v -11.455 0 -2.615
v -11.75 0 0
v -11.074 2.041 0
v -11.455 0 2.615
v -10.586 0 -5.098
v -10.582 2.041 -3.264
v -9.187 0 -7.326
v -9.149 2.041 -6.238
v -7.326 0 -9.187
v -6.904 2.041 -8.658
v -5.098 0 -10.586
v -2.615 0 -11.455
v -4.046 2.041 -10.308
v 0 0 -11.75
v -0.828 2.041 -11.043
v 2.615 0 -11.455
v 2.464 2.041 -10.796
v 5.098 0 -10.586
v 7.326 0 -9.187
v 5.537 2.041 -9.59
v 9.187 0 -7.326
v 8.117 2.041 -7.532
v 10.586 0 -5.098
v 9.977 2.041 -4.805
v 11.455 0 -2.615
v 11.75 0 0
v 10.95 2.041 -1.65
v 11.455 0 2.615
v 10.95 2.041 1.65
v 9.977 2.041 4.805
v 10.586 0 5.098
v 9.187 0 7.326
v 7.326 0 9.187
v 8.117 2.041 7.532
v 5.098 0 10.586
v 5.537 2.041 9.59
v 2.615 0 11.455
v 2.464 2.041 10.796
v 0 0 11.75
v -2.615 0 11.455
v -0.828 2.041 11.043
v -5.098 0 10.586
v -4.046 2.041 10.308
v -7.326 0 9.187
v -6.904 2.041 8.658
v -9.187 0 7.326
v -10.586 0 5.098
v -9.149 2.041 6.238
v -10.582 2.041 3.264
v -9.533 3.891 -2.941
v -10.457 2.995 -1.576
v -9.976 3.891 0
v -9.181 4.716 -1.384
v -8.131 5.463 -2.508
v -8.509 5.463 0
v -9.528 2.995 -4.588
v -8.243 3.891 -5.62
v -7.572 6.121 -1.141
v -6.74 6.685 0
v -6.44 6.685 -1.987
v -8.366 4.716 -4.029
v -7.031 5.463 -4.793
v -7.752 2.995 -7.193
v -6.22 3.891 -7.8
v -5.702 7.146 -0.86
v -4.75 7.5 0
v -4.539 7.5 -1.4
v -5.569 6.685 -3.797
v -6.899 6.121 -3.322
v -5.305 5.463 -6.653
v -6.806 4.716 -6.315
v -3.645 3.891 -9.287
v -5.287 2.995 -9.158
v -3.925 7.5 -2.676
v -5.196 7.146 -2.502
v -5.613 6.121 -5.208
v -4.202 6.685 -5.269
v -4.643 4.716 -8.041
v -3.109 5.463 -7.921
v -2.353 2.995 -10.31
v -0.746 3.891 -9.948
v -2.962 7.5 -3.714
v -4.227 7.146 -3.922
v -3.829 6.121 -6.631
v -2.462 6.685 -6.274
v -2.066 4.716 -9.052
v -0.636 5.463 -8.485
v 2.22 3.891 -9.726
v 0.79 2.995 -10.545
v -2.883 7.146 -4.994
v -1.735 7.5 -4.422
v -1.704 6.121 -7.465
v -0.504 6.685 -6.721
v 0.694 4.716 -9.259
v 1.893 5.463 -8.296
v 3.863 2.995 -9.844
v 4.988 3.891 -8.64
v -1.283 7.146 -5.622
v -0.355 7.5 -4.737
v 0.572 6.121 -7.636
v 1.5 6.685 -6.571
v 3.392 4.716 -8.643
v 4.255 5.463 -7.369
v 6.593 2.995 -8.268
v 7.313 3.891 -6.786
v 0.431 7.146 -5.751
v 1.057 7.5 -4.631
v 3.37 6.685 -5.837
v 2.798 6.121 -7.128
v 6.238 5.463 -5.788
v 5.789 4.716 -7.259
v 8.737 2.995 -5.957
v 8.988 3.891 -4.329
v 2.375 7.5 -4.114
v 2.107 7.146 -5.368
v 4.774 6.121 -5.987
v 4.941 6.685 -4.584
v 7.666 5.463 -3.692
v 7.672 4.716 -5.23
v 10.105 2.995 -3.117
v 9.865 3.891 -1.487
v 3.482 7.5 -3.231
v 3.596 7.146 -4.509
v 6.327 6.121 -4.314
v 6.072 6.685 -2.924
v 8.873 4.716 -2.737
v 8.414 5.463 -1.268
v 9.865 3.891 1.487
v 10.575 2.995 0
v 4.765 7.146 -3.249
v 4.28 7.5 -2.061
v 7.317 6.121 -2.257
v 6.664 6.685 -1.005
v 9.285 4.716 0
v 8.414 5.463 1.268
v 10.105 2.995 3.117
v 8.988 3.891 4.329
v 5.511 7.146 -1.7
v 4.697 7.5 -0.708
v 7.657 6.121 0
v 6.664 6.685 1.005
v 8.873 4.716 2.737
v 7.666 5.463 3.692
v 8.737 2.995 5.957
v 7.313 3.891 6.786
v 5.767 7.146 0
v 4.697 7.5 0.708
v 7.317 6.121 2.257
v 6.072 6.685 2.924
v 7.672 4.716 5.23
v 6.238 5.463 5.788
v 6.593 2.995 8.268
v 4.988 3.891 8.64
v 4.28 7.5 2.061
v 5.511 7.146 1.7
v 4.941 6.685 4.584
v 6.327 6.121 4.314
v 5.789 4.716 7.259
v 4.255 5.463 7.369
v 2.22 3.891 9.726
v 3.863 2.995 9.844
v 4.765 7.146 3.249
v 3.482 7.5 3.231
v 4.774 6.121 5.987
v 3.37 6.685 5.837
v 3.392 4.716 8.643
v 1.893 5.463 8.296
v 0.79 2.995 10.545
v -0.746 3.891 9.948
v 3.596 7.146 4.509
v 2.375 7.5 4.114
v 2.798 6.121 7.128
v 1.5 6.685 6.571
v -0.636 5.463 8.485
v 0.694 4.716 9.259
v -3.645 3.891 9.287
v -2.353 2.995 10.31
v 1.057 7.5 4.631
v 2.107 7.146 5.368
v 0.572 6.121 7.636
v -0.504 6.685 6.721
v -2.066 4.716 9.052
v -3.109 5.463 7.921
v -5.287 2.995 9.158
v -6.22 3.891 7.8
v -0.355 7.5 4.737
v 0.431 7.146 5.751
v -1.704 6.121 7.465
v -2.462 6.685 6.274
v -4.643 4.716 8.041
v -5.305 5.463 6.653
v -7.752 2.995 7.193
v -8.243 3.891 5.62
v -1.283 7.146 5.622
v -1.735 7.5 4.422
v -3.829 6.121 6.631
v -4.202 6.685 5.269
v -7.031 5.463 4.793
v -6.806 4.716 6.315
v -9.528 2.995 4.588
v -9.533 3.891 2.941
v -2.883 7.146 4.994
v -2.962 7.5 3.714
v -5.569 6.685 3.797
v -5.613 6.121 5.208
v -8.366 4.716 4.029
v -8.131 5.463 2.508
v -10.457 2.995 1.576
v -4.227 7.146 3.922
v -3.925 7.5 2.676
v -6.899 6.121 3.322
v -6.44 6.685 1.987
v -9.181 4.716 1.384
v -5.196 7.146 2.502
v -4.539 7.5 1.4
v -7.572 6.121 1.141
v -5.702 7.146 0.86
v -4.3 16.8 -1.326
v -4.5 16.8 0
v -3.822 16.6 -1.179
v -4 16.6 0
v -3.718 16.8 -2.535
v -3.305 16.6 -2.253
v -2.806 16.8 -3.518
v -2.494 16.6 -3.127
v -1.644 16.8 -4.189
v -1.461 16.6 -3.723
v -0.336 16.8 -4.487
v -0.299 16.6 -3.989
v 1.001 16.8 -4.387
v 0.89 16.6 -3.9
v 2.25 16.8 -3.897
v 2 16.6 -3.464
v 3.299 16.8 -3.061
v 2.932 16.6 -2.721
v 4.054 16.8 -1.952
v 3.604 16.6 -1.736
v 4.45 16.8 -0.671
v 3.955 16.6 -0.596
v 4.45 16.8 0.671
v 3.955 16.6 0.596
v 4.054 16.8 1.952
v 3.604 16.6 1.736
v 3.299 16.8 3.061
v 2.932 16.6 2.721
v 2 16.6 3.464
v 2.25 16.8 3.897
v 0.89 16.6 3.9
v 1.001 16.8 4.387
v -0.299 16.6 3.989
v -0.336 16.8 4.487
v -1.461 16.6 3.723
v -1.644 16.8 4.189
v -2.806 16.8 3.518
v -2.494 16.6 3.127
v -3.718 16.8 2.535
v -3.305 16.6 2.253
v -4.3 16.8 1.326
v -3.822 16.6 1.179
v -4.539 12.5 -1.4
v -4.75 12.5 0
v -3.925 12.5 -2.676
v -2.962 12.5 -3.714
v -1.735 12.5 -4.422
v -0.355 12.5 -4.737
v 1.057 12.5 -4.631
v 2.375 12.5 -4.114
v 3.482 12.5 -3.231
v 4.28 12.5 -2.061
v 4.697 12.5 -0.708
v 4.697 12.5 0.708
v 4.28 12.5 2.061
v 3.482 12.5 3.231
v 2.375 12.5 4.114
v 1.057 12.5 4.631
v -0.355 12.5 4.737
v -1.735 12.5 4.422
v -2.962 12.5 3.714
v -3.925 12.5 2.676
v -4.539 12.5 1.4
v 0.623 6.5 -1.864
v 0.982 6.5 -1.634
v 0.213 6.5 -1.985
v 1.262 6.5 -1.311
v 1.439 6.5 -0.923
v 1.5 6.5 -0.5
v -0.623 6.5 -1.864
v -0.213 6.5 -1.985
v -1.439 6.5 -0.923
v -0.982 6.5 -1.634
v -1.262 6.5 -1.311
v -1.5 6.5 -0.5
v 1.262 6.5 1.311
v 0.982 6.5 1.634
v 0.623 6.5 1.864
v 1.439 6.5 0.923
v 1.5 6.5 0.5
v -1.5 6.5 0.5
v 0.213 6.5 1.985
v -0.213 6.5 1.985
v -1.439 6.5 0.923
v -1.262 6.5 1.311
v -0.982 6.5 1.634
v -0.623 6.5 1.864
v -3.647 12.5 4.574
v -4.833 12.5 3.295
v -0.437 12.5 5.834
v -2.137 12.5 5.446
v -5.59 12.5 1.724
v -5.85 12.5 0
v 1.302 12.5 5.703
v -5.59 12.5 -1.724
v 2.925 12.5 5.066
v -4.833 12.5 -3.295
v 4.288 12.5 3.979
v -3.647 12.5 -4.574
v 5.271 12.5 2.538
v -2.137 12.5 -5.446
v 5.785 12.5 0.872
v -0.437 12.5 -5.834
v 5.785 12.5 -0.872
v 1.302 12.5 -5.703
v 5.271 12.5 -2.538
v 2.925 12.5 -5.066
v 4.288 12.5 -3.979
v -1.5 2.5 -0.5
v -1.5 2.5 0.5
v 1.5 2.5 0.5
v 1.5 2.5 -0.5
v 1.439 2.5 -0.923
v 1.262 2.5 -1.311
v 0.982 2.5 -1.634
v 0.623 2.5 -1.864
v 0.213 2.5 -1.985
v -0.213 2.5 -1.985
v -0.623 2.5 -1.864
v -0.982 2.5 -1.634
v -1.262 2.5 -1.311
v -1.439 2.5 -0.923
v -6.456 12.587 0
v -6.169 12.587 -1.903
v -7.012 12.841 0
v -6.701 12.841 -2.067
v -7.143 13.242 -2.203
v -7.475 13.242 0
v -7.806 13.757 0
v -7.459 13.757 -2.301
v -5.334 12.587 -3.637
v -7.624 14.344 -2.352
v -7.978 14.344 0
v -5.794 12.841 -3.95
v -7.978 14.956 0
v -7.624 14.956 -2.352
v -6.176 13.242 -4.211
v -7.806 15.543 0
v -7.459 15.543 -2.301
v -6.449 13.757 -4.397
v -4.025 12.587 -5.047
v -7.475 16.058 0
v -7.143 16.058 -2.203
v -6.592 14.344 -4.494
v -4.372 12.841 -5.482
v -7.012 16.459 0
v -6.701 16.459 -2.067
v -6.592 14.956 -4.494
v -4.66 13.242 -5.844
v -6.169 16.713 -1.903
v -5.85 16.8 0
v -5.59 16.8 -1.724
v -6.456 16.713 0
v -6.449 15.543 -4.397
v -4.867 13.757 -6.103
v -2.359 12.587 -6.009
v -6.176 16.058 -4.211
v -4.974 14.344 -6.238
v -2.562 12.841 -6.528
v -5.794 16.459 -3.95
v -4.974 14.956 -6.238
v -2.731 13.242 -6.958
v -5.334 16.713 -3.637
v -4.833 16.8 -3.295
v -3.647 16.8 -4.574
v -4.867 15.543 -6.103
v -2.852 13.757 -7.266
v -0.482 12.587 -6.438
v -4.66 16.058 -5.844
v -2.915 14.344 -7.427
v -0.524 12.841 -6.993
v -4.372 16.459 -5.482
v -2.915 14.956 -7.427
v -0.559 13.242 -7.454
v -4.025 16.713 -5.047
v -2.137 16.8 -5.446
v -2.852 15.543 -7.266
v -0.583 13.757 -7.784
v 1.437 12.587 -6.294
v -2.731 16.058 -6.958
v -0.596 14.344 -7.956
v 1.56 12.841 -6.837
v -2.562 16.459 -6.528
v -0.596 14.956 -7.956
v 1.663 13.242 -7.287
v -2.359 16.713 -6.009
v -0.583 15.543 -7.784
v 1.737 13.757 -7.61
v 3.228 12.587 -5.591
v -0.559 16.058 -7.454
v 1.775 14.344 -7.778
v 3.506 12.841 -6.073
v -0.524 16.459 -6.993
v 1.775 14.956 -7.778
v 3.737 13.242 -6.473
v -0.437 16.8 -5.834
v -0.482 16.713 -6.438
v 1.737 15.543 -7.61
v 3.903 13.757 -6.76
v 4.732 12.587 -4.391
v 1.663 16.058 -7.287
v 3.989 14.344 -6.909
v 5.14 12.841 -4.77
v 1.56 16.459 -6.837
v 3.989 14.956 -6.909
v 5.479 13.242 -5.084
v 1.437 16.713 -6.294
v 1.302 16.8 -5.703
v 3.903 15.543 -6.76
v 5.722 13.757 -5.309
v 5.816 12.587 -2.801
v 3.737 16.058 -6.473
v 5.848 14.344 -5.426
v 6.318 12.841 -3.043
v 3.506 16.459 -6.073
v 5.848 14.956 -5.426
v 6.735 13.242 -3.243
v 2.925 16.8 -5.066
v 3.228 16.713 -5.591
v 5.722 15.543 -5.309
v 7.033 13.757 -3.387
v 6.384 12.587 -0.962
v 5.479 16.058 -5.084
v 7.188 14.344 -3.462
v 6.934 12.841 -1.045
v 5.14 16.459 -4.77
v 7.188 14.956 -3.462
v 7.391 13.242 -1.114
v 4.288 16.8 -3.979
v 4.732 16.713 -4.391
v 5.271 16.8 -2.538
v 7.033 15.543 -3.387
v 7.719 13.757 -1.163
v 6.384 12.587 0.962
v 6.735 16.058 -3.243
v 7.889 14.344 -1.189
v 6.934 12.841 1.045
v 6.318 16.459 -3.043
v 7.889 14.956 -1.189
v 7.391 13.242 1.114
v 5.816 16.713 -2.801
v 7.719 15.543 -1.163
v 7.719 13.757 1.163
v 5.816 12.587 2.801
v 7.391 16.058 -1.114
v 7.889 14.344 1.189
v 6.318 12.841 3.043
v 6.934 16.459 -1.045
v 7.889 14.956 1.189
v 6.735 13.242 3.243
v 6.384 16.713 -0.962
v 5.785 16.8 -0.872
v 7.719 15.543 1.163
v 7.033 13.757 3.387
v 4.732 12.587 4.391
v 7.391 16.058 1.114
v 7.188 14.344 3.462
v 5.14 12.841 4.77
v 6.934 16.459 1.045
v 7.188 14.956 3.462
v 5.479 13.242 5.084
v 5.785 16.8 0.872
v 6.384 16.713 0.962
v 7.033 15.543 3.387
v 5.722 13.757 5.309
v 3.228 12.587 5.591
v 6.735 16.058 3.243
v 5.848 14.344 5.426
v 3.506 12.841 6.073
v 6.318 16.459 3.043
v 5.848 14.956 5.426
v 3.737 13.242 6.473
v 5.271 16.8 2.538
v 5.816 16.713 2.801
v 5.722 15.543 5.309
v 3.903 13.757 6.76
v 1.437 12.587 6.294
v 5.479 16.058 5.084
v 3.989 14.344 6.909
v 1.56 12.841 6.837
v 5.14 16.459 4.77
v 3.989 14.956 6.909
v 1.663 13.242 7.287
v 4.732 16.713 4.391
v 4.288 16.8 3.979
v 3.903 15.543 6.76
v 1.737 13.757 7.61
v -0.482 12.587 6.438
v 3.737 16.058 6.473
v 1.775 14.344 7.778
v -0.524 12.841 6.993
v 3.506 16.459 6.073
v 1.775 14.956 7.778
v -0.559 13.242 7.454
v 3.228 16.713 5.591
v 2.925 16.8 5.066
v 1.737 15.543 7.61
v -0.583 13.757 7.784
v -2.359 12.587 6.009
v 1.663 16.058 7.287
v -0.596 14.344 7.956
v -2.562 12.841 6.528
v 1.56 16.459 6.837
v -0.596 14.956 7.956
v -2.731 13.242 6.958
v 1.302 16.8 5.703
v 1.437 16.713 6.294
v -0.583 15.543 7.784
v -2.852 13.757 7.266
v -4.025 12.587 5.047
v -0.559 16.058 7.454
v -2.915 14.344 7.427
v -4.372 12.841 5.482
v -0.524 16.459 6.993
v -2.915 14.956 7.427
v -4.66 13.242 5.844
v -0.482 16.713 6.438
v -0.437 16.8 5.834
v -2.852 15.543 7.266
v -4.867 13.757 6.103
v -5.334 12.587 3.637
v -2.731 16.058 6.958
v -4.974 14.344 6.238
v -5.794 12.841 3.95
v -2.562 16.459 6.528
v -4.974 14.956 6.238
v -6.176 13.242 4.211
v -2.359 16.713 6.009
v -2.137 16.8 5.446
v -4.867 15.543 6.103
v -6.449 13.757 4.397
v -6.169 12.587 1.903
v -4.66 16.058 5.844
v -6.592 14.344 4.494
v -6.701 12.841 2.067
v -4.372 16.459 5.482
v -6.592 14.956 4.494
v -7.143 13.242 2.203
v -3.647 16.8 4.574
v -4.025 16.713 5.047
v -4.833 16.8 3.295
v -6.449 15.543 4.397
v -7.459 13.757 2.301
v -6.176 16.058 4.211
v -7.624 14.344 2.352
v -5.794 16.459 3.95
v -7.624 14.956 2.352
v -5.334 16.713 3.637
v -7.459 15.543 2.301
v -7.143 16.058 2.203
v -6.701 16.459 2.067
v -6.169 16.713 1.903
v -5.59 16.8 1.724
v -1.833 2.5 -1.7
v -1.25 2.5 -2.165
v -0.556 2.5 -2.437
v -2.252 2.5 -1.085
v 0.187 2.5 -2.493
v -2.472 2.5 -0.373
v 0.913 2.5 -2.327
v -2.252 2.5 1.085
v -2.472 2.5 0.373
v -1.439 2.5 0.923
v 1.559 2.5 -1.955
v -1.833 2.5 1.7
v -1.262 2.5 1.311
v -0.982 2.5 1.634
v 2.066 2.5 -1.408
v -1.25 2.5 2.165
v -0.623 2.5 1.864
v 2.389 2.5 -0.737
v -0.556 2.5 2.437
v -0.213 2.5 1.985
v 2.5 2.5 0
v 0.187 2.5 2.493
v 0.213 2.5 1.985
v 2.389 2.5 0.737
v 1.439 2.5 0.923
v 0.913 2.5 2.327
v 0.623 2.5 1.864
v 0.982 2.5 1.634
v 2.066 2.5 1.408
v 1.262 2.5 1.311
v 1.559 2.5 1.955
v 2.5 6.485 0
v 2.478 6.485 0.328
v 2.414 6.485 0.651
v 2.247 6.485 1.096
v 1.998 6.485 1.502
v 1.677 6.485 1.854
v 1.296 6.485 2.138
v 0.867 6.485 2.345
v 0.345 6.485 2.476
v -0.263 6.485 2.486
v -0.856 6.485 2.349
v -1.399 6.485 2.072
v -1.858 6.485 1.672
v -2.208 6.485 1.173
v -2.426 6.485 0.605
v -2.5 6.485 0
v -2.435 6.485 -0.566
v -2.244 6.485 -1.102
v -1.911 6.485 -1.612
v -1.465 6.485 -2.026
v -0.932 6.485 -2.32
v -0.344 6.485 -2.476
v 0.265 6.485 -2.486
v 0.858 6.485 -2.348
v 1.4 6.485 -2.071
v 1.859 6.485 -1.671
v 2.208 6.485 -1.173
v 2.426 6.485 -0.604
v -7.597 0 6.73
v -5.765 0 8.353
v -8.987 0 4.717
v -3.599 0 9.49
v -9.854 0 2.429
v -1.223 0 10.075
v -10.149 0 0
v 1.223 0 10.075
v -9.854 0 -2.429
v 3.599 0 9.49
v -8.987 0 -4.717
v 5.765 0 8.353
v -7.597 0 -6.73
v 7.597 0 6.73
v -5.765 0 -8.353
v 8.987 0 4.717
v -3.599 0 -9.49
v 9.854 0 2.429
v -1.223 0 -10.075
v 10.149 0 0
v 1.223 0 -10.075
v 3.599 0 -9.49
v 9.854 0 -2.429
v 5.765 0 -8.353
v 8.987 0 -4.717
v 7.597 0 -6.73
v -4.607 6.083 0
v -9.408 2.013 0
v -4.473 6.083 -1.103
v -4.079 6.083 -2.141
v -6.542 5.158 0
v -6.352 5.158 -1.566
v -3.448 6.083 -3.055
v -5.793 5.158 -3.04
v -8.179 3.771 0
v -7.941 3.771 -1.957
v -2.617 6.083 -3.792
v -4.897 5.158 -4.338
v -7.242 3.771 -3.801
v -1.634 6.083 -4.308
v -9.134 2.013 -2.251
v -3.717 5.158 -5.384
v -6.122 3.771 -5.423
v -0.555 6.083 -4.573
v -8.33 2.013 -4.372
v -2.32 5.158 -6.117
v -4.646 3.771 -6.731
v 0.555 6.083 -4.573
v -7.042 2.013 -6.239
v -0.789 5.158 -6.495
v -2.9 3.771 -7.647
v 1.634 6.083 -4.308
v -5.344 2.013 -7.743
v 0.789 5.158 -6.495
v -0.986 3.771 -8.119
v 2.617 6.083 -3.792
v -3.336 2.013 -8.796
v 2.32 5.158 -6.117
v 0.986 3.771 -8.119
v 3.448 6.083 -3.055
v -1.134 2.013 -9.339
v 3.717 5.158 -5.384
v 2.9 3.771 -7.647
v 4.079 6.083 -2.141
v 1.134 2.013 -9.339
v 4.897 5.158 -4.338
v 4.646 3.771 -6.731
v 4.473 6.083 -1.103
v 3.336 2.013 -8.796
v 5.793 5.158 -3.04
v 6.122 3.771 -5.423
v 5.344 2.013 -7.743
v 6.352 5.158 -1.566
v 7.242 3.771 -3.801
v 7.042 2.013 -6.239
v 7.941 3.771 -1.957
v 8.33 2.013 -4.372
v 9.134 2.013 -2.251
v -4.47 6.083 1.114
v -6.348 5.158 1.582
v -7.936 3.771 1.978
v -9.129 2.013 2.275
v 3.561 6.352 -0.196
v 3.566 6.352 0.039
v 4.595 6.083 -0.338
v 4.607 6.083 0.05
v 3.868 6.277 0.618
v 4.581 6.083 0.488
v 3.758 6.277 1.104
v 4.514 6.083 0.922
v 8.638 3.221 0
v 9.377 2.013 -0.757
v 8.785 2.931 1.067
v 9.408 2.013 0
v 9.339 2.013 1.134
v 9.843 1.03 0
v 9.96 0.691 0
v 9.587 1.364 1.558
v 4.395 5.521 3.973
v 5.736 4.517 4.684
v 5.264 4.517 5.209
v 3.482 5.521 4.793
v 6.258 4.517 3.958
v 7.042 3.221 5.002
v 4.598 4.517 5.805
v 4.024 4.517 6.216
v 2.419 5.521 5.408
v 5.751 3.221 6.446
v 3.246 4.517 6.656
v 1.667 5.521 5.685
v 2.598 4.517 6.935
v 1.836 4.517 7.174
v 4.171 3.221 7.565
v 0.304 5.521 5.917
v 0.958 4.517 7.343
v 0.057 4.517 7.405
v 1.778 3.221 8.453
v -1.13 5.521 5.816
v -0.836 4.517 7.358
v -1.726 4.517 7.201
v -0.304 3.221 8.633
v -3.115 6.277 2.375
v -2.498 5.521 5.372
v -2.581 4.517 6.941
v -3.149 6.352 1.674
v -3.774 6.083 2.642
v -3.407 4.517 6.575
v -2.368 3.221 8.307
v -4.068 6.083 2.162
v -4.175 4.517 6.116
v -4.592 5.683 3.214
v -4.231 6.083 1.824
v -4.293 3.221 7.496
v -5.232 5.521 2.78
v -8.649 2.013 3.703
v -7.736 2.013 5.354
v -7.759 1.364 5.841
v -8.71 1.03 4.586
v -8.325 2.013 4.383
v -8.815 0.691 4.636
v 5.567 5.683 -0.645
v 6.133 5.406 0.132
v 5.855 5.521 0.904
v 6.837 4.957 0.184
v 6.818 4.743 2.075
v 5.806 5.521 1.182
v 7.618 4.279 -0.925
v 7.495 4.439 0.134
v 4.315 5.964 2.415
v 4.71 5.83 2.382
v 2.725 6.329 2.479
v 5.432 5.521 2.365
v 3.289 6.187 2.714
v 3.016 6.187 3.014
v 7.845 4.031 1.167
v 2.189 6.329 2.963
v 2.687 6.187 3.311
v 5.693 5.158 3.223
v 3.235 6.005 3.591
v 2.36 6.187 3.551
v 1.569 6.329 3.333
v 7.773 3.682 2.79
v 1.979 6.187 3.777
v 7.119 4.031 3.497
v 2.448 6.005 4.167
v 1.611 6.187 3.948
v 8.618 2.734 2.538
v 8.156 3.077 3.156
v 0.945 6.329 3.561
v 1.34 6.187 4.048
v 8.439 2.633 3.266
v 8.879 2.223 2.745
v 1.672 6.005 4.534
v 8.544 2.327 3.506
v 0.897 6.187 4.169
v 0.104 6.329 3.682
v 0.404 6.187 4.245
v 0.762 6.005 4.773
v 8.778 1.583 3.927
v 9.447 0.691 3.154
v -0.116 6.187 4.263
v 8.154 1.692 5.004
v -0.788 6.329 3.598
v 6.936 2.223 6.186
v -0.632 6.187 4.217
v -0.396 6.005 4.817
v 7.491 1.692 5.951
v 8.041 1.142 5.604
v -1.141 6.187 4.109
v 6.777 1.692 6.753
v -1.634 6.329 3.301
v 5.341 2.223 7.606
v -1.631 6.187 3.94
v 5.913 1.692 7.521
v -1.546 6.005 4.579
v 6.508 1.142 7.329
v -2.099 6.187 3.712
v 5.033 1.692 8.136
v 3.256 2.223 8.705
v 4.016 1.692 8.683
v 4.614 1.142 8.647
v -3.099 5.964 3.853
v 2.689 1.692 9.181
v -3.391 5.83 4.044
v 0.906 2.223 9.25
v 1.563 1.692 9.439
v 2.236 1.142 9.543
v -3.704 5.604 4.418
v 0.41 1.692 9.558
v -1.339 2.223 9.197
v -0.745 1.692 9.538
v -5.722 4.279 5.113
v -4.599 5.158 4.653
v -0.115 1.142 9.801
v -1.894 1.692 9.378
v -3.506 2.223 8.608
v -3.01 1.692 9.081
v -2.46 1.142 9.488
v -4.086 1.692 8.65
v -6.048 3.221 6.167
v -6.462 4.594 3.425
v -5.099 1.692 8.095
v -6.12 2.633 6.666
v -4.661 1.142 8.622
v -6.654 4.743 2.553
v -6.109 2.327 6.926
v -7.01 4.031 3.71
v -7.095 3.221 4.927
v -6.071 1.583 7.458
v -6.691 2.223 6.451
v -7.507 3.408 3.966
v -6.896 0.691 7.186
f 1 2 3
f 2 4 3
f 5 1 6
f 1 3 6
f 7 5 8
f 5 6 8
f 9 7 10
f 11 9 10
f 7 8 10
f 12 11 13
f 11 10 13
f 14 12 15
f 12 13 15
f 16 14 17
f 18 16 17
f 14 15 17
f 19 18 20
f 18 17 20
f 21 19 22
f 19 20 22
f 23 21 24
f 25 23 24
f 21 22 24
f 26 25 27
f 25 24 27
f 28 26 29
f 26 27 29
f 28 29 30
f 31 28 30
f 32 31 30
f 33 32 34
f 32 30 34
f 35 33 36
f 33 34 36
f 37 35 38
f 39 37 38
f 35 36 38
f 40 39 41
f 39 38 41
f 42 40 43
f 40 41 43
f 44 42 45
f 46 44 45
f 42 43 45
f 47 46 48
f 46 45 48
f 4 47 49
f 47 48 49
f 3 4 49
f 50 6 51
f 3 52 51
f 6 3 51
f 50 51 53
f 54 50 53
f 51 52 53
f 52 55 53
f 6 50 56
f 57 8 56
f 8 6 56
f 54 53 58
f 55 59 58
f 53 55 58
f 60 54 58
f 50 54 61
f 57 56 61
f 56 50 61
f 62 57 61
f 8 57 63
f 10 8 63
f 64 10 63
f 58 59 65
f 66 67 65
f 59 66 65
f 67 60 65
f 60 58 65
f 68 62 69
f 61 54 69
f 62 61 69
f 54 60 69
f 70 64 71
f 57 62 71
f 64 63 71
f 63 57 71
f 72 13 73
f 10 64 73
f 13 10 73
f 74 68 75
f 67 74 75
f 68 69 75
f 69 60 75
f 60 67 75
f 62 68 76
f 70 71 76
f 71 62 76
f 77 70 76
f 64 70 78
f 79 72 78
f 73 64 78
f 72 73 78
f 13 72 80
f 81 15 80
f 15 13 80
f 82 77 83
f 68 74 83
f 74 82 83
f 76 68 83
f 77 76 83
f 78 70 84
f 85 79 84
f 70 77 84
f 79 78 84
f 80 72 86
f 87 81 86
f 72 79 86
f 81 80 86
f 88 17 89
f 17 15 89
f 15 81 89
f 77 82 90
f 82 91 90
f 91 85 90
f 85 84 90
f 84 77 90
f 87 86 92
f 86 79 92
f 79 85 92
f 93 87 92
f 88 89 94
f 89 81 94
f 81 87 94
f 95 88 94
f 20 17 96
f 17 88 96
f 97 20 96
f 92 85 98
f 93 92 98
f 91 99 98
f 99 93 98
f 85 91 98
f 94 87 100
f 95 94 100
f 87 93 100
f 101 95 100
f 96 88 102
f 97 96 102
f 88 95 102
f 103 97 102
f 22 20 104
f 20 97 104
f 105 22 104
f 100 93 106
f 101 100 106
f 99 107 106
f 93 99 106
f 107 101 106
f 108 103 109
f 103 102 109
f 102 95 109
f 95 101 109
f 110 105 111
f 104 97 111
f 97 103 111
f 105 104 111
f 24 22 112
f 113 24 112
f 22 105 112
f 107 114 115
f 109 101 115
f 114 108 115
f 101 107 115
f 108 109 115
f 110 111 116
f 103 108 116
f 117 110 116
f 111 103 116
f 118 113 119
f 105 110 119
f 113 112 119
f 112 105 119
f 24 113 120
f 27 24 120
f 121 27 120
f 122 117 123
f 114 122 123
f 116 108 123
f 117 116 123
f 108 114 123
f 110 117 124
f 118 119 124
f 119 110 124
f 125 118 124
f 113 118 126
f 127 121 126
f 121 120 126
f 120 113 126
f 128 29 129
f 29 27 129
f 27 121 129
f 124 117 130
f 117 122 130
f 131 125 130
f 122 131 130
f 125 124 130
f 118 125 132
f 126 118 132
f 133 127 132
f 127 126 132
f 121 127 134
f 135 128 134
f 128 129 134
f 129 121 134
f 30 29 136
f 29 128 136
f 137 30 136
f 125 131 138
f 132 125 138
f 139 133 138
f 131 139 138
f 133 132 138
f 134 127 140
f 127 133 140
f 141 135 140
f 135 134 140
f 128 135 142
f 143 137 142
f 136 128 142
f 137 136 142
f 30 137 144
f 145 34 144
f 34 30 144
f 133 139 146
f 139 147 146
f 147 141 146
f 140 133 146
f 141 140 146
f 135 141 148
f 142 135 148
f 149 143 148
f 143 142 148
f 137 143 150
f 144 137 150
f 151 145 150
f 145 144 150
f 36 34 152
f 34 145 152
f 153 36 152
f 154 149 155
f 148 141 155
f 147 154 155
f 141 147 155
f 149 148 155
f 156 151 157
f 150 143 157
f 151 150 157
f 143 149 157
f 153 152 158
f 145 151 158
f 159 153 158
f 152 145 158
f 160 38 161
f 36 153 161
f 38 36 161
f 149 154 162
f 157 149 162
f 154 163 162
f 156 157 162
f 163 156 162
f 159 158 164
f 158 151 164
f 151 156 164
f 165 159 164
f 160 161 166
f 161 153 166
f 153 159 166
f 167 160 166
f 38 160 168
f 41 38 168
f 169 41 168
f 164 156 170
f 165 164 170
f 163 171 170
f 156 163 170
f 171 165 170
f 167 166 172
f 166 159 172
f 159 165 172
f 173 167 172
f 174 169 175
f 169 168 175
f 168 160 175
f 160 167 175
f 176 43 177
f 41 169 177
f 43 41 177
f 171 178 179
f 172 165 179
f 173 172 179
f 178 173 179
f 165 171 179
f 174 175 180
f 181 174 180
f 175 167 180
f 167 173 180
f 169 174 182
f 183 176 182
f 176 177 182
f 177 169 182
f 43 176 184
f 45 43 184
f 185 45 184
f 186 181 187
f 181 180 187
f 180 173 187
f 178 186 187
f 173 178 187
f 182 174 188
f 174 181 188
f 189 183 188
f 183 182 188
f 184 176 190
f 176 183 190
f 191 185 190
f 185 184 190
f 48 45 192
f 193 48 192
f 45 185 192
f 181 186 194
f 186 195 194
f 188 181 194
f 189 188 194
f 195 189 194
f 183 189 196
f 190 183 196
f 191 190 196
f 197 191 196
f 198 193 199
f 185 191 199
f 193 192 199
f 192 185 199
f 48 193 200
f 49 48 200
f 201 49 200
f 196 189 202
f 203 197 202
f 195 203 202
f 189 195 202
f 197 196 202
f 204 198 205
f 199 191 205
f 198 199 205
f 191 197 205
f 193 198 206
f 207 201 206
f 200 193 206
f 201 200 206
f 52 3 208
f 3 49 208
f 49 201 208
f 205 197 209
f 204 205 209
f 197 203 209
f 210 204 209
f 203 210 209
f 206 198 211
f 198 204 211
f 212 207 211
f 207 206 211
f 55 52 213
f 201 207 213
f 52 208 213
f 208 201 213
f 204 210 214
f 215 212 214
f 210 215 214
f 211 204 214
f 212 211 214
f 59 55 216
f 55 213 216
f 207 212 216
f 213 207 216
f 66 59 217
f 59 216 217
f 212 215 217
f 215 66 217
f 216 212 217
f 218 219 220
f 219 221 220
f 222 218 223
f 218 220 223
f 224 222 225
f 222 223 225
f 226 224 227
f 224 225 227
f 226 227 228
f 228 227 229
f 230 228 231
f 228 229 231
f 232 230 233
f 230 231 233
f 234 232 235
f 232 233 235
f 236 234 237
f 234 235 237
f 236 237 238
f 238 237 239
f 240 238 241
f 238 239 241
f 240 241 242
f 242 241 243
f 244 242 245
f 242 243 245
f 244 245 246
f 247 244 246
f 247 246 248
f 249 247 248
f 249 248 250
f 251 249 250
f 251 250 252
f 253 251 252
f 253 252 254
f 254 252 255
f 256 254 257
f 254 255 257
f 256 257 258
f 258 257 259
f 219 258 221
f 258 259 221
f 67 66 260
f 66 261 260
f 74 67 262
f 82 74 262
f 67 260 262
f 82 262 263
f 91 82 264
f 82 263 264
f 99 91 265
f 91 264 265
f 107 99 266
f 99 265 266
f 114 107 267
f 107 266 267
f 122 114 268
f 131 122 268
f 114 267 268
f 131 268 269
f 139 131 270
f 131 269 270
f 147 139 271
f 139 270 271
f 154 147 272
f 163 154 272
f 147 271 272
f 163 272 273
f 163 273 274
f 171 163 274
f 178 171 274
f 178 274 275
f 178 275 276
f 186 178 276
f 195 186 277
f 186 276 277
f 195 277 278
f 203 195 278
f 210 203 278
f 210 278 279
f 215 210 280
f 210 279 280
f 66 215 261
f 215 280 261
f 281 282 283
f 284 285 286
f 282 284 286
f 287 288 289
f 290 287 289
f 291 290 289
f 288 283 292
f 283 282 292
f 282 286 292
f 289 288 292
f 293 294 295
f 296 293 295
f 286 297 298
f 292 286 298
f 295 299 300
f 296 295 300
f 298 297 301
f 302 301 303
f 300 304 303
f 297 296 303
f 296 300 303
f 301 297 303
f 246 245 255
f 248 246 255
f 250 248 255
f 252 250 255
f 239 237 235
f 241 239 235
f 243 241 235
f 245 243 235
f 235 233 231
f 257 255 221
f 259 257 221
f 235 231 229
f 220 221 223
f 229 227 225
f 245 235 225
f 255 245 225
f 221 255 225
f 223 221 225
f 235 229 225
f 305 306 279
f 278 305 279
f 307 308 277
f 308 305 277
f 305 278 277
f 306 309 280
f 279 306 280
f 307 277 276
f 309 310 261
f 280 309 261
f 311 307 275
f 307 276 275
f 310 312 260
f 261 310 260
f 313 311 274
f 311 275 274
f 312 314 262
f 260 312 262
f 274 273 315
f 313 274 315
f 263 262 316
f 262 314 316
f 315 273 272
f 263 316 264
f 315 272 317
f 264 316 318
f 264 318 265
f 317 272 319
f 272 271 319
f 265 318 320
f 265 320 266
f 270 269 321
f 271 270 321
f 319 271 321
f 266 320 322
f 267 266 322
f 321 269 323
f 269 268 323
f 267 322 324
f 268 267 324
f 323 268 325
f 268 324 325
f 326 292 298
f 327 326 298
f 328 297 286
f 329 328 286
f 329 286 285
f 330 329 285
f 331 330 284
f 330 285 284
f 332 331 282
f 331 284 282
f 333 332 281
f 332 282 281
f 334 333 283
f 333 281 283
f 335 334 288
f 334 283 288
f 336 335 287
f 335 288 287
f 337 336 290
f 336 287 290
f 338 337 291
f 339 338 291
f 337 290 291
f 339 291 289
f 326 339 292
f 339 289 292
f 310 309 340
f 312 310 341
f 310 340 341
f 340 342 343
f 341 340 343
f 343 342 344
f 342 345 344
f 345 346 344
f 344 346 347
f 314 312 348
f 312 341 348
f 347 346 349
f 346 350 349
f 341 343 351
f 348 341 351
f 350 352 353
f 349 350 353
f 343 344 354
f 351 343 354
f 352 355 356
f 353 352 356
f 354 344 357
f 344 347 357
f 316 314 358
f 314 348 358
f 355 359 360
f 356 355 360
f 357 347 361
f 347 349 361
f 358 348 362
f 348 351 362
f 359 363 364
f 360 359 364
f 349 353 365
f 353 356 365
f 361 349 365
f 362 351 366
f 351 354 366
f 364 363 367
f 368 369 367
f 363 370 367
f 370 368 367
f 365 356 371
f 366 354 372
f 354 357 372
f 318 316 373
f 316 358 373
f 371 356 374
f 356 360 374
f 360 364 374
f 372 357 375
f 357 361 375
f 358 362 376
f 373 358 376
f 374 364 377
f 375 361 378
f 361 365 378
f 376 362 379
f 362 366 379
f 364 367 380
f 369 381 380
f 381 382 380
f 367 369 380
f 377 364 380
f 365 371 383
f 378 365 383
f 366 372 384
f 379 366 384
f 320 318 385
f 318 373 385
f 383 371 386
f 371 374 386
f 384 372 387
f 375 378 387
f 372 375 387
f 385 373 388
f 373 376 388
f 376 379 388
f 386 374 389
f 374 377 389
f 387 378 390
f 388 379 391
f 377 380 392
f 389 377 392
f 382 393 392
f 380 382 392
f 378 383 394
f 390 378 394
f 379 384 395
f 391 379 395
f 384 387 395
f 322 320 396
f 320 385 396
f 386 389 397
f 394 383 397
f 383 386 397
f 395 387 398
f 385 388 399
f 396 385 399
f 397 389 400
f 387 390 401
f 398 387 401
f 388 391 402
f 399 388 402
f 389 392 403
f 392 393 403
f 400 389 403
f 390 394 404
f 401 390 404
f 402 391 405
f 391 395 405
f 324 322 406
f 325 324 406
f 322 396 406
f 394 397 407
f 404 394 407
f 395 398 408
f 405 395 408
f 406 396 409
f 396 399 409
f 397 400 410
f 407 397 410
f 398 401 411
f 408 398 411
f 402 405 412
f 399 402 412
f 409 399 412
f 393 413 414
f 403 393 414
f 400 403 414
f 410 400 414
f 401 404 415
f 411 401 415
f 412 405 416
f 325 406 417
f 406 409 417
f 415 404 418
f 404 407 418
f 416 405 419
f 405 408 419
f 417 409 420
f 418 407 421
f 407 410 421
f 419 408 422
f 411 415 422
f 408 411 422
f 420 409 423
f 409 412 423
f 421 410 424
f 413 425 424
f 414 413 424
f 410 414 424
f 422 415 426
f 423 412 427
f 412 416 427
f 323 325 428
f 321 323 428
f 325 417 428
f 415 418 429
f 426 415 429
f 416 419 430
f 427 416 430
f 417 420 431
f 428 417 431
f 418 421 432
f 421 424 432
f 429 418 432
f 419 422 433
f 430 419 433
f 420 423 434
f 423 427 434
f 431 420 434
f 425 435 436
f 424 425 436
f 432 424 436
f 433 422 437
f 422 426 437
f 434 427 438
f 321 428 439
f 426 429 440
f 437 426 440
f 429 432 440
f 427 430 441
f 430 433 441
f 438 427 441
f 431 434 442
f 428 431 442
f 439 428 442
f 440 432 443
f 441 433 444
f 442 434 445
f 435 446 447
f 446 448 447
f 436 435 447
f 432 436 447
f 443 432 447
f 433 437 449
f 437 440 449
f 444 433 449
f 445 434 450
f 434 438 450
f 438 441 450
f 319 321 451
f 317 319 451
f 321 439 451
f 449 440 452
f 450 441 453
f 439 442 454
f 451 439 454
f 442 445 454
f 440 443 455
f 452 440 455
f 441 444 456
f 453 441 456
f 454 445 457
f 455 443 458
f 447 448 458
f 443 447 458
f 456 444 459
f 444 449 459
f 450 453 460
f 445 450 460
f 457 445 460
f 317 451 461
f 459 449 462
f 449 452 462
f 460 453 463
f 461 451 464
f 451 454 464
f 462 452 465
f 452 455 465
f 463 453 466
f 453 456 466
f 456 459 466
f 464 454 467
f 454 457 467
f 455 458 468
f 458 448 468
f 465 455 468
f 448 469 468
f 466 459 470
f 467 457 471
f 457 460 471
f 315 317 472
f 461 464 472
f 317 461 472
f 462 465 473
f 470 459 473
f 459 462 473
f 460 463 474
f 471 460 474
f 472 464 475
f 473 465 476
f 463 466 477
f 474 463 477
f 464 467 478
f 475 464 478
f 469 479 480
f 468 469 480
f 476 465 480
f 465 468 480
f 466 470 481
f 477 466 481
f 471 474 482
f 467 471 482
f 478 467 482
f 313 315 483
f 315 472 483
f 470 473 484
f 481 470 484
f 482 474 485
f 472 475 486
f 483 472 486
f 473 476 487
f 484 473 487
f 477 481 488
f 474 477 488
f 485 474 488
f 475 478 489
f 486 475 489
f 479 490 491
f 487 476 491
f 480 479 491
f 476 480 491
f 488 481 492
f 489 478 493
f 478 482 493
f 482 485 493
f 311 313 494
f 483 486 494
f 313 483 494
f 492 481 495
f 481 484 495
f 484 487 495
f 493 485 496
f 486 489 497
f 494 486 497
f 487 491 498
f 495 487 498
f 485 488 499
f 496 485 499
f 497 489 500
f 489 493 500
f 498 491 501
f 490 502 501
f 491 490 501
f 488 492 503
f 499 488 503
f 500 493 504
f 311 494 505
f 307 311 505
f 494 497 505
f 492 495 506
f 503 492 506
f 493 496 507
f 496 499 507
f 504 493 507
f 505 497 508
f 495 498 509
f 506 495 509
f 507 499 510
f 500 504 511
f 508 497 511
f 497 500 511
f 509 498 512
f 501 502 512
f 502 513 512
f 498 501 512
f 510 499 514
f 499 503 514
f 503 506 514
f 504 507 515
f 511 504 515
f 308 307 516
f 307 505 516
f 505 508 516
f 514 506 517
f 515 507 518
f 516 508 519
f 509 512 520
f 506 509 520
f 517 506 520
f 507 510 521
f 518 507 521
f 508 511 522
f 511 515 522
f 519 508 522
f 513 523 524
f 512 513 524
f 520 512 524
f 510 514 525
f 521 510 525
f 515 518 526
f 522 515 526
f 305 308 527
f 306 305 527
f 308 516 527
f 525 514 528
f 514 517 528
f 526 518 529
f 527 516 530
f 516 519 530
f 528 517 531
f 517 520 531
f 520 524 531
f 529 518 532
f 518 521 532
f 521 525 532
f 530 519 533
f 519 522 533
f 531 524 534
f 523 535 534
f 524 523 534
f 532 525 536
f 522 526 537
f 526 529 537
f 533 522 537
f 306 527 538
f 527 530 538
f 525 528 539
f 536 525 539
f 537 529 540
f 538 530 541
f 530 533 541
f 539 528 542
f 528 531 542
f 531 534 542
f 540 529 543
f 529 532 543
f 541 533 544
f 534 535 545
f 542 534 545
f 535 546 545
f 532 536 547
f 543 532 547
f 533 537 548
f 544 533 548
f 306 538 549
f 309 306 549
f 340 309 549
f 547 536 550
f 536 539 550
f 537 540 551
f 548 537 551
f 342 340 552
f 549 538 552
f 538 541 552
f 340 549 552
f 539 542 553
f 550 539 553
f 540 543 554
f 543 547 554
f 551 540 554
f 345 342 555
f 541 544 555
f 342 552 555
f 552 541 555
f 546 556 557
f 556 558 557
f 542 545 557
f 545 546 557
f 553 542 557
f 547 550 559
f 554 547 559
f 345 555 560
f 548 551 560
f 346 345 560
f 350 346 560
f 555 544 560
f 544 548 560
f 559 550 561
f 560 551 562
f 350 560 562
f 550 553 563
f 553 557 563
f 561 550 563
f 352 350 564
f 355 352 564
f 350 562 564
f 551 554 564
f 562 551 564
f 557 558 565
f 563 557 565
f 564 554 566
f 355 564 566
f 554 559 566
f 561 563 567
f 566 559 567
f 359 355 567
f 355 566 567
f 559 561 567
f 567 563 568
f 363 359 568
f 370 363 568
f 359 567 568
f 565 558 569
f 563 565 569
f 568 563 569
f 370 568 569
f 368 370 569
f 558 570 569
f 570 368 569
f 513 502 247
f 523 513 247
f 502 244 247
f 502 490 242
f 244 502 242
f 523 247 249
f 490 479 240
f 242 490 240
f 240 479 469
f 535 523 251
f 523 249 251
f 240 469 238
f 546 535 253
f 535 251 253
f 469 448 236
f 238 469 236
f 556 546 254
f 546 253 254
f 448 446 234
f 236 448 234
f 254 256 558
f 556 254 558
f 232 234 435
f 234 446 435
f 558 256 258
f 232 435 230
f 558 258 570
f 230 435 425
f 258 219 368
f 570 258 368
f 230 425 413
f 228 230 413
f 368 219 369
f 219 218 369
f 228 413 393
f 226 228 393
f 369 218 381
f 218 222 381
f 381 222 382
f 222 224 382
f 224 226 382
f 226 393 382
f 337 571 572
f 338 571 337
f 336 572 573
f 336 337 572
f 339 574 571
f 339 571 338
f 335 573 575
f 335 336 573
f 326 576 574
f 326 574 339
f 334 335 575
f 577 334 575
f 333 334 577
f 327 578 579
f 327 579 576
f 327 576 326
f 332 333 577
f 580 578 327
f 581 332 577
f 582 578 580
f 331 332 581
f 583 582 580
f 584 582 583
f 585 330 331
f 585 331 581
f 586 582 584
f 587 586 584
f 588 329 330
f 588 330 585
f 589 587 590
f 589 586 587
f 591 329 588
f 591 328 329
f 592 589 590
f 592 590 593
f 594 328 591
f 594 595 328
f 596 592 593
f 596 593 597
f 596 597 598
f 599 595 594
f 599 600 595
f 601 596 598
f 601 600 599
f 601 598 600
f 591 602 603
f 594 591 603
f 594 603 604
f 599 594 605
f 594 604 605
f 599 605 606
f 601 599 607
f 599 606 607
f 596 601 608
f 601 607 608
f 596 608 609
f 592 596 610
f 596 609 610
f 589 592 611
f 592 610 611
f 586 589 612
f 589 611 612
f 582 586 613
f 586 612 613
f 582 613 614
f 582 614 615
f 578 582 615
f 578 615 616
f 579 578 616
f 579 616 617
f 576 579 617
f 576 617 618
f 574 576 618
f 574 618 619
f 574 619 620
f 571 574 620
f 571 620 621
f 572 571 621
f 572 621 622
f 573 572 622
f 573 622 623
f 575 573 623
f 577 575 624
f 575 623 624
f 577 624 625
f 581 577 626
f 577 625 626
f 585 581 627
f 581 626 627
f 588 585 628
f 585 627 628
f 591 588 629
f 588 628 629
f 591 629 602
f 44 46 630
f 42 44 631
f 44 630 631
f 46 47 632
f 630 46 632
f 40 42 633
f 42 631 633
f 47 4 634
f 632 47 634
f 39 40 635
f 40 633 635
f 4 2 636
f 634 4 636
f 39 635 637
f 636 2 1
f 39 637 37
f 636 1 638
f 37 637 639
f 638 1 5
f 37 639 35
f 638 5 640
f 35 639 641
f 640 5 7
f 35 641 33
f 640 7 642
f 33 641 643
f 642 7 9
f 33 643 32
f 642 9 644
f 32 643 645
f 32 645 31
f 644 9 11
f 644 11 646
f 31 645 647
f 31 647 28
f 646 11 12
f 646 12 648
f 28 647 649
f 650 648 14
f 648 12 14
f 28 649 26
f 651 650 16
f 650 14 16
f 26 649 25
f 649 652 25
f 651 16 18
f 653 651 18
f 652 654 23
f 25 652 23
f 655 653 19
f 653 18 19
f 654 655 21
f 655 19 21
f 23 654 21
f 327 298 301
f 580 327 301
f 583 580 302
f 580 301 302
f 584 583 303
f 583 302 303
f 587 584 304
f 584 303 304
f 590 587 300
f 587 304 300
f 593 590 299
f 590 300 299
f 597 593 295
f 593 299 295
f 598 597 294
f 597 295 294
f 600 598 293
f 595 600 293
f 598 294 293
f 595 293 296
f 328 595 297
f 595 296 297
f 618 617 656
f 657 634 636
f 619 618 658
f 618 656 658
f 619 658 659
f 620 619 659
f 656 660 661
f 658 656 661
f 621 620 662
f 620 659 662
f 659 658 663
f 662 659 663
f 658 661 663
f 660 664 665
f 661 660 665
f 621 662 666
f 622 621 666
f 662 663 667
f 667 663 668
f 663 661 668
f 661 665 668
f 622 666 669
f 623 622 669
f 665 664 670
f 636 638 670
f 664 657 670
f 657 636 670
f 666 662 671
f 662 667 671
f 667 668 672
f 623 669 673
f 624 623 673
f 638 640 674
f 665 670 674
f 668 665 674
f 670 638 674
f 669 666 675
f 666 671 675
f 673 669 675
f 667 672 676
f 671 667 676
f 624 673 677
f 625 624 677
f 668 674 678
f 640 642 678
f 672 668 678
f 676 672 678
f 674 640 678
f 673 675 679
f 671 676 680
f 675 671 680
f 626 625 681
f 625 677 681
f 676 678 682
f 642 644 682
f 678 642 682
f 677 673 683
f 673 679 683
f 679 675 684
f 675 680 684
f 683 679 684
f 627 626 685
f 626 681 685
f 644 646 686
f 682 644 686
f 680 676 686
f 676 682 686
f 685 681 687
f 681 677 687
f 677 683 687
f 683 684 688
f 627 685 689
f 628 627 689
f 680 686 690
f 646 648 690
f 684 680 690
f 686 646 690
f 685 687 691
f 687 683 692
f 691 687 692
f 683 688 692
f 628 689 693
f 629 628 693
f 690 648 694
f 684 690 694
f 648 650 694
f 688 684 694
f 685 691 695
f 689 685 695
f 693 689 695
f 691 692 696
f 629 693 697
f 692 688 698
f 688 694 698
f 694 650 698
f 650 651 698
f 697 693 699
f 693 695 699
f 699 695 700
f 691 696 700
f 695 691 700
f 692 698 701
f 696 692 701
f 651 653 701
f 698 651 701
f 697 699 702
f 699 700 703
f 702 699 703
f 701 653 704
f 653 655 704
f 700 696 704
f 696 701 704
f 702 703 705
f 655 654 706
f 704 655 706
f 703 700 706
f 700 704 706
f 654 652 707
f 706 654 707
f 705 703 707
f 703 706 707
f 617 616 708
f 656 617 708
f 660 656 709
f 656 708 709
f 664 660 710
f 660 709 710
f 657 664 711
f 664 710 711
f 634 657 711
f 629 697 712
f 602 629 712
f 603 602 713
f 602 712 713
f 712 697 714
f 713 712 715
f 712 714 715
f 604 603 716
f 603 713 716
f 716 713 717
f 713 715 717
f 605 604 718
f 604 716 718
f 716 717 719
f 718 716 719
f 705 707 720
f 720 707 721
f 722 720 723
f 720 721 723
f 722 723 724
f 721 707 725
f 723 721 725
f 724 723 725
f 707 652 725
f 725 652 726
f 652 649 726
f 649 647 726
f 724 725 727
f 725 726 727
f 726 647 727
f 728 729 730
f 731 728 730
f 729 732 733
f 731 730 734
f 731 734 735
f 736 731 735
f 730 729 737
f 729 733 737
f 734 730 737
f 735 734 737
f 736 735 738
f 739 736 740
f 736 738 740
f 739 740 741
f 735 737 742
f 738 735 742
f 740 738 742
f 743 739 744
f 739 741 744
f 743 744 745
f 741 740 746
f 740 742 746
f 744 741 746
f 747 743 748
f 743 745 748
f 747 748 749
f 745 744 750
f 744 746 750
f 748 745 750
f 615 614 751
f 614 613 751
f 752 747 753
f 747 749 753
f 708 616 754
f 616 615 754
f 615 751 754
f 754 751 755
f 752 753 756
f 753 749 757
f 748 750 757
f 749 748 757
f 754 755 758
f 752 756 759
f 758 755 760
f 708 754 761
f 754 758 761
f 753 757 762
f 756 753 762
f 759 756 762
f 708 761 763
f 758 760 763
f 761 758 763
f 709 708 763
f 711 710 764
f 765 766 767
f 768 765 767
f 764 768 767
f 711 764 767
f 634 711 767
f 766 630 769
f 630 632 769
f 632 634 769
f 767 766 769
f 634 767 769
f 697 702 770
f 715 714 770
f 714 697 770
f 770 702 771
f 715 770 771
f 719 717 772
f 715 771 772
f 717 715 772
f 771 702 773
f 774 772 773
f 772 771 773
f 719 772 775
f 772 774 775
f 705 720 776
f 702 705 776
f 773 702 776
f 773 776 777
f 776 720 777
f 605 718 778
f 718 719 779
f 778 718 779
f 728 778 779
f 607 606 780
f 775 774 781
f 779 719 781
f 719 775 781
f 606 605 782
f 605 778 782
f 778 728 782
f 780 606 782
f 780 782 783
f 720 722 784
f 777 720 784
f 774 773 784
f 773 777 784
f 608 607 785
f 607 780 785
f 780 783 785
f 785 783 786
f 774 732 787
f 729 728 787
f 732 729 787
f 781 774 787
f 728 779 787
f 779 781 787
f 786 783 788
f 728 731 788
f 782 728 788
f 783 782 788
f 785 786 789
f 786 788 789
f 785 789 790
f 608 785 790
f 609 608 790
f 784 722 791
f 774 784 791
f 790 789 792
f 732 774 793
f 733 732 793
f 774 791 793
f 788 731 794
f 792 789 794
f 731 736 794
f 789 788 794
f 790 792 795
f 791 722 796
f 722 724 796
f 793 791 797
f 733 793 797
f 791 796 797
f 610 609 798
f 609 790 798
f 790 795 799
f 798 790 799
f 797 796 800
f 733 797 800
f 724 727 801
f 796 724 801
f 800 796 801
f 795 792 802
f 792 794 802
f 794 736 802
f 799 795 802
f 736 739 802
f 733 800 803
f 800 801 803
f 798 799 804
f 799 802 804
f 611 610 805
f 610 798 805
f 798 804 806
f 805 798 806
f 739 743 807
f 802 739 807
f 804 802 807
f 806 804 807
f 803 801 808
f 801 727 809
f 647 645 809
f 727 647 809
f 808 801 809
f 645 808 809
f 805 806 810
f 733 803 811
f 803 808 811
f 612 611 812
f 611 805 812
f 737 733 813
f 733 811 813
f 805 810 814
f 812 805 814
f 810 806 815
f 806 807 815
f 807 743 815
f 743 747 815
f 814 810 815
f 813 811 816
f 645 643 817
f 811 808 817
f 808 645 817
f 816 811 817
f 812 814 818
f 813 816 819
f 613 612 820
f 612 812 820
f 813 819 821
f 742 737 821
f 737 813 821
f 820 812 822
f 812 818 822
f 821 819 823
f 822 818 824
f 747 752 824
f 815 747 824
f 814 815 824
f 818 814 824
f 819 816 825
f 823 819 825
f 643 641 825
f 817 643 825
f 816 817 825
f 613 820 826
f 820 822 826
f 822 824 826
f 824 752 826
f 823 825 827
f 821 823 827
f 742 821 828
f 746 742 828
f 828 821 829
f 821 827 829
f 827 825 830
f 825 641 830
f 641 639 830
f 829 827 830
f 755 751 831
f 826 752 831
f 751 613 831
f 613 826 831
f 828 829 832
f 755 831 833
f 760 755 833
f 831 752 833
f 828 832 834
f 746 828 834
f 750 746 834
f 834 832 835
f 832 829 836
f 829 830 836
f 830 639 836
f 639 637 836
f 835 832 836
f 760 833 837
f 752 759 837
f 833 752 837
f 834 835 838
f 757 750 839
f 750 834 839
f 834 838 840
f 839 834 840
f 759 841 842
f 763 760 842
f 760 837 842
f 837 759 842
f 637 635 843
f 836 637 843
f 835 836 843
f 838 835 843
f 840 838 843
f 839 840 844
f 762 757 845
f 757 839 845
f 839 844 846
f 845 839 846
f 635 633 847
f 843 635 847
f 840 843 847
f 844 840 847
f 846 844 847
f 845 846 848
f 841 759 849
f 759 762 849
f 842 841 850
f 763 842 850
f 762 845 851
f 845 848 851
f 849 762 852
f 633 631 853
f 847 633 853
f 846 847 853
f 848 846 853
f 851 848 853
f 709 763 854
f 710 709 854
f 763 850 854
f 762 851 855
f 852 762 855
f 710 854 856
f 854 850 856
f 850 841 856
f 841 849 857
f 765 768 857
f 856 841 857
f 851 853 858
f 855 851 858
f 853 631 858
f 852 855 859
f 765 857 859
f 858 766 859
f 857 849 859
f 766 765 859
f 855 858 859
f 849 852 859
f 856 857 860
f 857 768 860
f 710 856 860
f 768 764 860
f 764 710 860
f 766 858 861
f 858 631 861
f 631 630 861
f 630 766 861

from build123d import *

# Parameters (mm, degrees)
SKETCH2_R           = 2.5
BOSS_EXTRUDE2_DEPTH = 4
CUT_EXTRUDE1_DEPTH  = 20.550319811


with BuildPart() as part:
    # Sketch1 → Revolve1 (revolve)
    with BuildSketch(Plane.XY):
        with BuildLine():
            ThreePointArc((2, 6.5), (7.211992141, 4.675975116), (10.149199243, 0))
            Line((10.149199243, 0), (11.75, 0))
            ThreePointArc((11.75, 0), (9.285070189, 4.71606551), (4.75, 7.5))
            Line((4.75, 7.5), (4.75, 12.5))
            Line((4.75, 12.5), (5.85, 12.5))
            ThreePointArc((5.85, 12.5), (8, 14.65), (5.85, 16.8))
            Line((5.85, 16.8), (4.5, 16.8))
            Line((4.5, 16.8), (4, 16.6))
            Line((4, 16.6), (0, 16.6))
            Line((0, 16.6), (0, 6.5))
            Line((0, 6.5), (2, 6.5))
        make_face()
    revolve(axis=Axis((0, 0, 0), (0, -1, 0)))

    # Sketch2 → Boss-Extrude2 (add)
    with BuildSketch(Plane.XZ.offset(-6.5)):
        Circle(SKETCH2_R)
    extrude(amount=BOSS_EXTRUDE2_DEPTH)

    # Sketch2<3> → Cut-Extrude1 (cut, through all)
    with BuildSketch(Plane.XZ.offset(-6.5)):
        with BuildLine():
            Line((1.5, -0.5), (1.5, 0.5))
            ThreePointArc((1.5, 0.5), (0, 2), (-1.5, 0.5))
            Line((-1.5, 0.5), (-1.5, -0.5))
            ThreePointArc((-1.5, -0.5), (0, -2), (1.5, -0.5))
        make_face()
    extrude(amount=CUT_EXTRUDE1_DEPTH, mode=Mode.SUBTRACT)


solid = part.part
